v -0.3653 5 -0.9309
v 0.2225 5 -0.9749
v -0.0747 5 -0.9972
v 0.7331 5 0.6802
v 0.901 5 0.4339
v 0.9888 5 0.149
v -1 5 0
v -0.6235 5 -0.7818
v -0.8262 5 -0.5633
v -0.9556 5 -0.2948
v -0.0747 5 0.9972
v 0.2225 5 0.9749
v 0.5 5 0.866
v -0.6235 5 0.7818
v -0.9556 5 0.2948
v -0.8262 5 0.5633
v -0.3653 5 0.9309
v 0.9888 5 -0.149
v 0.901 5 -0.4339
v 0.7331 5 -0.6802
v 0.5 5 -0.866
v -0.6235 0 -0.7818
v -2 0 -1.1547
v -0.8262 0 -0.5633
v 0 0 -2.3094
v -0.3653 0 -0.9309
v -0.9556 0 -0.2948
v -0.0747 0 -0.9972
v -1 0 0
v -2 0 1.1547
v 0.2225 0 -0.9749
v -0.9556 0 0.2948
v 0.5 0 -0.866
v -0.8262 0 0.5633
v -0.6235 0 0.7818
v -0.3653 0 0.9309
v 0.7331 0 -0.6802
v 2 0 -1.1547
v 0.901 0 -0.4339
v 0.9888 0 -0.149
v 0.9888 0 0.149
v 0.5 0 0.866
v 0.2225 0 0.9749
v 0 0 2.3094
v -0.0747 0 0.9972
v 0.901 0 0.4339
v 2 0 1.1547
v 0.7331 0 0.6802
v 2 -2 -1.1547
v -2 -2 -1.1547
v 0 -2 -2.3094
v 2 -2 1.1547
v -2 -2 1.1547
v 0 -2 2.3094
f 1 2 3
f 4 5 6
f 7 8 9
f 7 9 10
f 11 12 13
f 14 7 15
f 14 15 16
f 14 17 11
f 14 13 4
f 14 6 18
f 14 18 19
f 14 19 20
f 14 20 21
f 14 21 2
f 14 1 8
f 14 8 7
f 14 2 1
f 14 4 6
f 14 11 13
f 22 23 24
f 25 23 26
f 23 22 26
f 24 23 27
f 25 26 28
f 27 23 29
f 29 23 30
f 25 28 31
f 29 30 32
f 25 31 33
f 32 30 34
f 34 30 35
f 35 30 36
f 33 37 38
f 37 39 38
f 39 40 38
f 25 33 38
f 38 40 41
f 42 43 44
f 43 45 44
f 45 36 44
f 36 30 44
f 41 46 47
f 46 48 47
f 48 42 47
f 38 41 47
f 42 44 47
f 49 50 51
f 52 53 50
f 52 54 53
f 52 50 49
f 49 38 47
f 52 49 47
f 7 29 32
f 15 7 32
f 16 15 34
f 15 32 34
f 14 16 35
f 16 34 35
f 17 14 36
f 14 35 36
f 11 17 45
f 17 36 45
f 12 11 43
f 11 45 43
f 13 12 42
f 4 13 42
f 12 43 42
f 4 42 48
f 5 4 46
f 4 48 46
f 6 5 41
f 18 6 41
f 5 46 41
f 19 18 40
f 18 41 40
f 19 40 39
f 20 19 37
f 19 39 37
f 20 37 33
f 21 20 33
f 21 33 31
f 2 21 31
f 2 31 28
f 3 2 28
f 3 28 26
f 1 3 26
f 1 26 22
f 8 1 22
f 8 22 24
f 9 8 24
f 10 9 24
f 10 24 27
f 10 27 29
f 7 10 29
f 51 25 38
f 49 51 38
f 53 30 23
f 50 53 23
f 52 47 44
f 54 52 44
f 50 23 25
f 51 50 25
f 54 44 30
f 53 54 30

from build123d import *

# Parameters (mm, degrees)
F0_R     = 1
F1_DEPTH = 2
F2_R     = 1
F3_DEPTH = 5
F4_DEPTH = 2


with BuildPart() as f1:
    # F0 (on Front) → F1 (new body)
    with BuildSketch(Plane.XZ):
        Polygon((-2, 1.1547005384), (-2, -1.1547005384), (0, -2.3094010768), (2, -1.1547005384), (2, 1.1547005384), (0, 2.3094010768), align=None)
        Circle(F0_R, mode=Mode.SUBTRACT)
        Circle(F0_R)
    extrude(amount=F1_DEPTH)

    # F2 (on face) → F3 (join)
    with BuildSketch(Plane(origin=(0, 0, 0), x_dir=(-1, 0, 0), z_dir=(0, 1, 0))):
        Circle(F2_R)
    extrude(amount=F3_DEPTH)

    # F0 (on Front) → F4 (join)
    with BuildSketch(Plane.XZ):
        Polygon((-2, 1.1547005384), (-2, -1.1547005384), (0, -2.3094010768), (2, -1.1547005384), (2, 1.1547005384), (0, 2.3094010768), align=None)
        Circle(F0_R, mode=Mode.SUBTRACT)
    extrude(amount=F4_DEPTH)


solid = f1.part
